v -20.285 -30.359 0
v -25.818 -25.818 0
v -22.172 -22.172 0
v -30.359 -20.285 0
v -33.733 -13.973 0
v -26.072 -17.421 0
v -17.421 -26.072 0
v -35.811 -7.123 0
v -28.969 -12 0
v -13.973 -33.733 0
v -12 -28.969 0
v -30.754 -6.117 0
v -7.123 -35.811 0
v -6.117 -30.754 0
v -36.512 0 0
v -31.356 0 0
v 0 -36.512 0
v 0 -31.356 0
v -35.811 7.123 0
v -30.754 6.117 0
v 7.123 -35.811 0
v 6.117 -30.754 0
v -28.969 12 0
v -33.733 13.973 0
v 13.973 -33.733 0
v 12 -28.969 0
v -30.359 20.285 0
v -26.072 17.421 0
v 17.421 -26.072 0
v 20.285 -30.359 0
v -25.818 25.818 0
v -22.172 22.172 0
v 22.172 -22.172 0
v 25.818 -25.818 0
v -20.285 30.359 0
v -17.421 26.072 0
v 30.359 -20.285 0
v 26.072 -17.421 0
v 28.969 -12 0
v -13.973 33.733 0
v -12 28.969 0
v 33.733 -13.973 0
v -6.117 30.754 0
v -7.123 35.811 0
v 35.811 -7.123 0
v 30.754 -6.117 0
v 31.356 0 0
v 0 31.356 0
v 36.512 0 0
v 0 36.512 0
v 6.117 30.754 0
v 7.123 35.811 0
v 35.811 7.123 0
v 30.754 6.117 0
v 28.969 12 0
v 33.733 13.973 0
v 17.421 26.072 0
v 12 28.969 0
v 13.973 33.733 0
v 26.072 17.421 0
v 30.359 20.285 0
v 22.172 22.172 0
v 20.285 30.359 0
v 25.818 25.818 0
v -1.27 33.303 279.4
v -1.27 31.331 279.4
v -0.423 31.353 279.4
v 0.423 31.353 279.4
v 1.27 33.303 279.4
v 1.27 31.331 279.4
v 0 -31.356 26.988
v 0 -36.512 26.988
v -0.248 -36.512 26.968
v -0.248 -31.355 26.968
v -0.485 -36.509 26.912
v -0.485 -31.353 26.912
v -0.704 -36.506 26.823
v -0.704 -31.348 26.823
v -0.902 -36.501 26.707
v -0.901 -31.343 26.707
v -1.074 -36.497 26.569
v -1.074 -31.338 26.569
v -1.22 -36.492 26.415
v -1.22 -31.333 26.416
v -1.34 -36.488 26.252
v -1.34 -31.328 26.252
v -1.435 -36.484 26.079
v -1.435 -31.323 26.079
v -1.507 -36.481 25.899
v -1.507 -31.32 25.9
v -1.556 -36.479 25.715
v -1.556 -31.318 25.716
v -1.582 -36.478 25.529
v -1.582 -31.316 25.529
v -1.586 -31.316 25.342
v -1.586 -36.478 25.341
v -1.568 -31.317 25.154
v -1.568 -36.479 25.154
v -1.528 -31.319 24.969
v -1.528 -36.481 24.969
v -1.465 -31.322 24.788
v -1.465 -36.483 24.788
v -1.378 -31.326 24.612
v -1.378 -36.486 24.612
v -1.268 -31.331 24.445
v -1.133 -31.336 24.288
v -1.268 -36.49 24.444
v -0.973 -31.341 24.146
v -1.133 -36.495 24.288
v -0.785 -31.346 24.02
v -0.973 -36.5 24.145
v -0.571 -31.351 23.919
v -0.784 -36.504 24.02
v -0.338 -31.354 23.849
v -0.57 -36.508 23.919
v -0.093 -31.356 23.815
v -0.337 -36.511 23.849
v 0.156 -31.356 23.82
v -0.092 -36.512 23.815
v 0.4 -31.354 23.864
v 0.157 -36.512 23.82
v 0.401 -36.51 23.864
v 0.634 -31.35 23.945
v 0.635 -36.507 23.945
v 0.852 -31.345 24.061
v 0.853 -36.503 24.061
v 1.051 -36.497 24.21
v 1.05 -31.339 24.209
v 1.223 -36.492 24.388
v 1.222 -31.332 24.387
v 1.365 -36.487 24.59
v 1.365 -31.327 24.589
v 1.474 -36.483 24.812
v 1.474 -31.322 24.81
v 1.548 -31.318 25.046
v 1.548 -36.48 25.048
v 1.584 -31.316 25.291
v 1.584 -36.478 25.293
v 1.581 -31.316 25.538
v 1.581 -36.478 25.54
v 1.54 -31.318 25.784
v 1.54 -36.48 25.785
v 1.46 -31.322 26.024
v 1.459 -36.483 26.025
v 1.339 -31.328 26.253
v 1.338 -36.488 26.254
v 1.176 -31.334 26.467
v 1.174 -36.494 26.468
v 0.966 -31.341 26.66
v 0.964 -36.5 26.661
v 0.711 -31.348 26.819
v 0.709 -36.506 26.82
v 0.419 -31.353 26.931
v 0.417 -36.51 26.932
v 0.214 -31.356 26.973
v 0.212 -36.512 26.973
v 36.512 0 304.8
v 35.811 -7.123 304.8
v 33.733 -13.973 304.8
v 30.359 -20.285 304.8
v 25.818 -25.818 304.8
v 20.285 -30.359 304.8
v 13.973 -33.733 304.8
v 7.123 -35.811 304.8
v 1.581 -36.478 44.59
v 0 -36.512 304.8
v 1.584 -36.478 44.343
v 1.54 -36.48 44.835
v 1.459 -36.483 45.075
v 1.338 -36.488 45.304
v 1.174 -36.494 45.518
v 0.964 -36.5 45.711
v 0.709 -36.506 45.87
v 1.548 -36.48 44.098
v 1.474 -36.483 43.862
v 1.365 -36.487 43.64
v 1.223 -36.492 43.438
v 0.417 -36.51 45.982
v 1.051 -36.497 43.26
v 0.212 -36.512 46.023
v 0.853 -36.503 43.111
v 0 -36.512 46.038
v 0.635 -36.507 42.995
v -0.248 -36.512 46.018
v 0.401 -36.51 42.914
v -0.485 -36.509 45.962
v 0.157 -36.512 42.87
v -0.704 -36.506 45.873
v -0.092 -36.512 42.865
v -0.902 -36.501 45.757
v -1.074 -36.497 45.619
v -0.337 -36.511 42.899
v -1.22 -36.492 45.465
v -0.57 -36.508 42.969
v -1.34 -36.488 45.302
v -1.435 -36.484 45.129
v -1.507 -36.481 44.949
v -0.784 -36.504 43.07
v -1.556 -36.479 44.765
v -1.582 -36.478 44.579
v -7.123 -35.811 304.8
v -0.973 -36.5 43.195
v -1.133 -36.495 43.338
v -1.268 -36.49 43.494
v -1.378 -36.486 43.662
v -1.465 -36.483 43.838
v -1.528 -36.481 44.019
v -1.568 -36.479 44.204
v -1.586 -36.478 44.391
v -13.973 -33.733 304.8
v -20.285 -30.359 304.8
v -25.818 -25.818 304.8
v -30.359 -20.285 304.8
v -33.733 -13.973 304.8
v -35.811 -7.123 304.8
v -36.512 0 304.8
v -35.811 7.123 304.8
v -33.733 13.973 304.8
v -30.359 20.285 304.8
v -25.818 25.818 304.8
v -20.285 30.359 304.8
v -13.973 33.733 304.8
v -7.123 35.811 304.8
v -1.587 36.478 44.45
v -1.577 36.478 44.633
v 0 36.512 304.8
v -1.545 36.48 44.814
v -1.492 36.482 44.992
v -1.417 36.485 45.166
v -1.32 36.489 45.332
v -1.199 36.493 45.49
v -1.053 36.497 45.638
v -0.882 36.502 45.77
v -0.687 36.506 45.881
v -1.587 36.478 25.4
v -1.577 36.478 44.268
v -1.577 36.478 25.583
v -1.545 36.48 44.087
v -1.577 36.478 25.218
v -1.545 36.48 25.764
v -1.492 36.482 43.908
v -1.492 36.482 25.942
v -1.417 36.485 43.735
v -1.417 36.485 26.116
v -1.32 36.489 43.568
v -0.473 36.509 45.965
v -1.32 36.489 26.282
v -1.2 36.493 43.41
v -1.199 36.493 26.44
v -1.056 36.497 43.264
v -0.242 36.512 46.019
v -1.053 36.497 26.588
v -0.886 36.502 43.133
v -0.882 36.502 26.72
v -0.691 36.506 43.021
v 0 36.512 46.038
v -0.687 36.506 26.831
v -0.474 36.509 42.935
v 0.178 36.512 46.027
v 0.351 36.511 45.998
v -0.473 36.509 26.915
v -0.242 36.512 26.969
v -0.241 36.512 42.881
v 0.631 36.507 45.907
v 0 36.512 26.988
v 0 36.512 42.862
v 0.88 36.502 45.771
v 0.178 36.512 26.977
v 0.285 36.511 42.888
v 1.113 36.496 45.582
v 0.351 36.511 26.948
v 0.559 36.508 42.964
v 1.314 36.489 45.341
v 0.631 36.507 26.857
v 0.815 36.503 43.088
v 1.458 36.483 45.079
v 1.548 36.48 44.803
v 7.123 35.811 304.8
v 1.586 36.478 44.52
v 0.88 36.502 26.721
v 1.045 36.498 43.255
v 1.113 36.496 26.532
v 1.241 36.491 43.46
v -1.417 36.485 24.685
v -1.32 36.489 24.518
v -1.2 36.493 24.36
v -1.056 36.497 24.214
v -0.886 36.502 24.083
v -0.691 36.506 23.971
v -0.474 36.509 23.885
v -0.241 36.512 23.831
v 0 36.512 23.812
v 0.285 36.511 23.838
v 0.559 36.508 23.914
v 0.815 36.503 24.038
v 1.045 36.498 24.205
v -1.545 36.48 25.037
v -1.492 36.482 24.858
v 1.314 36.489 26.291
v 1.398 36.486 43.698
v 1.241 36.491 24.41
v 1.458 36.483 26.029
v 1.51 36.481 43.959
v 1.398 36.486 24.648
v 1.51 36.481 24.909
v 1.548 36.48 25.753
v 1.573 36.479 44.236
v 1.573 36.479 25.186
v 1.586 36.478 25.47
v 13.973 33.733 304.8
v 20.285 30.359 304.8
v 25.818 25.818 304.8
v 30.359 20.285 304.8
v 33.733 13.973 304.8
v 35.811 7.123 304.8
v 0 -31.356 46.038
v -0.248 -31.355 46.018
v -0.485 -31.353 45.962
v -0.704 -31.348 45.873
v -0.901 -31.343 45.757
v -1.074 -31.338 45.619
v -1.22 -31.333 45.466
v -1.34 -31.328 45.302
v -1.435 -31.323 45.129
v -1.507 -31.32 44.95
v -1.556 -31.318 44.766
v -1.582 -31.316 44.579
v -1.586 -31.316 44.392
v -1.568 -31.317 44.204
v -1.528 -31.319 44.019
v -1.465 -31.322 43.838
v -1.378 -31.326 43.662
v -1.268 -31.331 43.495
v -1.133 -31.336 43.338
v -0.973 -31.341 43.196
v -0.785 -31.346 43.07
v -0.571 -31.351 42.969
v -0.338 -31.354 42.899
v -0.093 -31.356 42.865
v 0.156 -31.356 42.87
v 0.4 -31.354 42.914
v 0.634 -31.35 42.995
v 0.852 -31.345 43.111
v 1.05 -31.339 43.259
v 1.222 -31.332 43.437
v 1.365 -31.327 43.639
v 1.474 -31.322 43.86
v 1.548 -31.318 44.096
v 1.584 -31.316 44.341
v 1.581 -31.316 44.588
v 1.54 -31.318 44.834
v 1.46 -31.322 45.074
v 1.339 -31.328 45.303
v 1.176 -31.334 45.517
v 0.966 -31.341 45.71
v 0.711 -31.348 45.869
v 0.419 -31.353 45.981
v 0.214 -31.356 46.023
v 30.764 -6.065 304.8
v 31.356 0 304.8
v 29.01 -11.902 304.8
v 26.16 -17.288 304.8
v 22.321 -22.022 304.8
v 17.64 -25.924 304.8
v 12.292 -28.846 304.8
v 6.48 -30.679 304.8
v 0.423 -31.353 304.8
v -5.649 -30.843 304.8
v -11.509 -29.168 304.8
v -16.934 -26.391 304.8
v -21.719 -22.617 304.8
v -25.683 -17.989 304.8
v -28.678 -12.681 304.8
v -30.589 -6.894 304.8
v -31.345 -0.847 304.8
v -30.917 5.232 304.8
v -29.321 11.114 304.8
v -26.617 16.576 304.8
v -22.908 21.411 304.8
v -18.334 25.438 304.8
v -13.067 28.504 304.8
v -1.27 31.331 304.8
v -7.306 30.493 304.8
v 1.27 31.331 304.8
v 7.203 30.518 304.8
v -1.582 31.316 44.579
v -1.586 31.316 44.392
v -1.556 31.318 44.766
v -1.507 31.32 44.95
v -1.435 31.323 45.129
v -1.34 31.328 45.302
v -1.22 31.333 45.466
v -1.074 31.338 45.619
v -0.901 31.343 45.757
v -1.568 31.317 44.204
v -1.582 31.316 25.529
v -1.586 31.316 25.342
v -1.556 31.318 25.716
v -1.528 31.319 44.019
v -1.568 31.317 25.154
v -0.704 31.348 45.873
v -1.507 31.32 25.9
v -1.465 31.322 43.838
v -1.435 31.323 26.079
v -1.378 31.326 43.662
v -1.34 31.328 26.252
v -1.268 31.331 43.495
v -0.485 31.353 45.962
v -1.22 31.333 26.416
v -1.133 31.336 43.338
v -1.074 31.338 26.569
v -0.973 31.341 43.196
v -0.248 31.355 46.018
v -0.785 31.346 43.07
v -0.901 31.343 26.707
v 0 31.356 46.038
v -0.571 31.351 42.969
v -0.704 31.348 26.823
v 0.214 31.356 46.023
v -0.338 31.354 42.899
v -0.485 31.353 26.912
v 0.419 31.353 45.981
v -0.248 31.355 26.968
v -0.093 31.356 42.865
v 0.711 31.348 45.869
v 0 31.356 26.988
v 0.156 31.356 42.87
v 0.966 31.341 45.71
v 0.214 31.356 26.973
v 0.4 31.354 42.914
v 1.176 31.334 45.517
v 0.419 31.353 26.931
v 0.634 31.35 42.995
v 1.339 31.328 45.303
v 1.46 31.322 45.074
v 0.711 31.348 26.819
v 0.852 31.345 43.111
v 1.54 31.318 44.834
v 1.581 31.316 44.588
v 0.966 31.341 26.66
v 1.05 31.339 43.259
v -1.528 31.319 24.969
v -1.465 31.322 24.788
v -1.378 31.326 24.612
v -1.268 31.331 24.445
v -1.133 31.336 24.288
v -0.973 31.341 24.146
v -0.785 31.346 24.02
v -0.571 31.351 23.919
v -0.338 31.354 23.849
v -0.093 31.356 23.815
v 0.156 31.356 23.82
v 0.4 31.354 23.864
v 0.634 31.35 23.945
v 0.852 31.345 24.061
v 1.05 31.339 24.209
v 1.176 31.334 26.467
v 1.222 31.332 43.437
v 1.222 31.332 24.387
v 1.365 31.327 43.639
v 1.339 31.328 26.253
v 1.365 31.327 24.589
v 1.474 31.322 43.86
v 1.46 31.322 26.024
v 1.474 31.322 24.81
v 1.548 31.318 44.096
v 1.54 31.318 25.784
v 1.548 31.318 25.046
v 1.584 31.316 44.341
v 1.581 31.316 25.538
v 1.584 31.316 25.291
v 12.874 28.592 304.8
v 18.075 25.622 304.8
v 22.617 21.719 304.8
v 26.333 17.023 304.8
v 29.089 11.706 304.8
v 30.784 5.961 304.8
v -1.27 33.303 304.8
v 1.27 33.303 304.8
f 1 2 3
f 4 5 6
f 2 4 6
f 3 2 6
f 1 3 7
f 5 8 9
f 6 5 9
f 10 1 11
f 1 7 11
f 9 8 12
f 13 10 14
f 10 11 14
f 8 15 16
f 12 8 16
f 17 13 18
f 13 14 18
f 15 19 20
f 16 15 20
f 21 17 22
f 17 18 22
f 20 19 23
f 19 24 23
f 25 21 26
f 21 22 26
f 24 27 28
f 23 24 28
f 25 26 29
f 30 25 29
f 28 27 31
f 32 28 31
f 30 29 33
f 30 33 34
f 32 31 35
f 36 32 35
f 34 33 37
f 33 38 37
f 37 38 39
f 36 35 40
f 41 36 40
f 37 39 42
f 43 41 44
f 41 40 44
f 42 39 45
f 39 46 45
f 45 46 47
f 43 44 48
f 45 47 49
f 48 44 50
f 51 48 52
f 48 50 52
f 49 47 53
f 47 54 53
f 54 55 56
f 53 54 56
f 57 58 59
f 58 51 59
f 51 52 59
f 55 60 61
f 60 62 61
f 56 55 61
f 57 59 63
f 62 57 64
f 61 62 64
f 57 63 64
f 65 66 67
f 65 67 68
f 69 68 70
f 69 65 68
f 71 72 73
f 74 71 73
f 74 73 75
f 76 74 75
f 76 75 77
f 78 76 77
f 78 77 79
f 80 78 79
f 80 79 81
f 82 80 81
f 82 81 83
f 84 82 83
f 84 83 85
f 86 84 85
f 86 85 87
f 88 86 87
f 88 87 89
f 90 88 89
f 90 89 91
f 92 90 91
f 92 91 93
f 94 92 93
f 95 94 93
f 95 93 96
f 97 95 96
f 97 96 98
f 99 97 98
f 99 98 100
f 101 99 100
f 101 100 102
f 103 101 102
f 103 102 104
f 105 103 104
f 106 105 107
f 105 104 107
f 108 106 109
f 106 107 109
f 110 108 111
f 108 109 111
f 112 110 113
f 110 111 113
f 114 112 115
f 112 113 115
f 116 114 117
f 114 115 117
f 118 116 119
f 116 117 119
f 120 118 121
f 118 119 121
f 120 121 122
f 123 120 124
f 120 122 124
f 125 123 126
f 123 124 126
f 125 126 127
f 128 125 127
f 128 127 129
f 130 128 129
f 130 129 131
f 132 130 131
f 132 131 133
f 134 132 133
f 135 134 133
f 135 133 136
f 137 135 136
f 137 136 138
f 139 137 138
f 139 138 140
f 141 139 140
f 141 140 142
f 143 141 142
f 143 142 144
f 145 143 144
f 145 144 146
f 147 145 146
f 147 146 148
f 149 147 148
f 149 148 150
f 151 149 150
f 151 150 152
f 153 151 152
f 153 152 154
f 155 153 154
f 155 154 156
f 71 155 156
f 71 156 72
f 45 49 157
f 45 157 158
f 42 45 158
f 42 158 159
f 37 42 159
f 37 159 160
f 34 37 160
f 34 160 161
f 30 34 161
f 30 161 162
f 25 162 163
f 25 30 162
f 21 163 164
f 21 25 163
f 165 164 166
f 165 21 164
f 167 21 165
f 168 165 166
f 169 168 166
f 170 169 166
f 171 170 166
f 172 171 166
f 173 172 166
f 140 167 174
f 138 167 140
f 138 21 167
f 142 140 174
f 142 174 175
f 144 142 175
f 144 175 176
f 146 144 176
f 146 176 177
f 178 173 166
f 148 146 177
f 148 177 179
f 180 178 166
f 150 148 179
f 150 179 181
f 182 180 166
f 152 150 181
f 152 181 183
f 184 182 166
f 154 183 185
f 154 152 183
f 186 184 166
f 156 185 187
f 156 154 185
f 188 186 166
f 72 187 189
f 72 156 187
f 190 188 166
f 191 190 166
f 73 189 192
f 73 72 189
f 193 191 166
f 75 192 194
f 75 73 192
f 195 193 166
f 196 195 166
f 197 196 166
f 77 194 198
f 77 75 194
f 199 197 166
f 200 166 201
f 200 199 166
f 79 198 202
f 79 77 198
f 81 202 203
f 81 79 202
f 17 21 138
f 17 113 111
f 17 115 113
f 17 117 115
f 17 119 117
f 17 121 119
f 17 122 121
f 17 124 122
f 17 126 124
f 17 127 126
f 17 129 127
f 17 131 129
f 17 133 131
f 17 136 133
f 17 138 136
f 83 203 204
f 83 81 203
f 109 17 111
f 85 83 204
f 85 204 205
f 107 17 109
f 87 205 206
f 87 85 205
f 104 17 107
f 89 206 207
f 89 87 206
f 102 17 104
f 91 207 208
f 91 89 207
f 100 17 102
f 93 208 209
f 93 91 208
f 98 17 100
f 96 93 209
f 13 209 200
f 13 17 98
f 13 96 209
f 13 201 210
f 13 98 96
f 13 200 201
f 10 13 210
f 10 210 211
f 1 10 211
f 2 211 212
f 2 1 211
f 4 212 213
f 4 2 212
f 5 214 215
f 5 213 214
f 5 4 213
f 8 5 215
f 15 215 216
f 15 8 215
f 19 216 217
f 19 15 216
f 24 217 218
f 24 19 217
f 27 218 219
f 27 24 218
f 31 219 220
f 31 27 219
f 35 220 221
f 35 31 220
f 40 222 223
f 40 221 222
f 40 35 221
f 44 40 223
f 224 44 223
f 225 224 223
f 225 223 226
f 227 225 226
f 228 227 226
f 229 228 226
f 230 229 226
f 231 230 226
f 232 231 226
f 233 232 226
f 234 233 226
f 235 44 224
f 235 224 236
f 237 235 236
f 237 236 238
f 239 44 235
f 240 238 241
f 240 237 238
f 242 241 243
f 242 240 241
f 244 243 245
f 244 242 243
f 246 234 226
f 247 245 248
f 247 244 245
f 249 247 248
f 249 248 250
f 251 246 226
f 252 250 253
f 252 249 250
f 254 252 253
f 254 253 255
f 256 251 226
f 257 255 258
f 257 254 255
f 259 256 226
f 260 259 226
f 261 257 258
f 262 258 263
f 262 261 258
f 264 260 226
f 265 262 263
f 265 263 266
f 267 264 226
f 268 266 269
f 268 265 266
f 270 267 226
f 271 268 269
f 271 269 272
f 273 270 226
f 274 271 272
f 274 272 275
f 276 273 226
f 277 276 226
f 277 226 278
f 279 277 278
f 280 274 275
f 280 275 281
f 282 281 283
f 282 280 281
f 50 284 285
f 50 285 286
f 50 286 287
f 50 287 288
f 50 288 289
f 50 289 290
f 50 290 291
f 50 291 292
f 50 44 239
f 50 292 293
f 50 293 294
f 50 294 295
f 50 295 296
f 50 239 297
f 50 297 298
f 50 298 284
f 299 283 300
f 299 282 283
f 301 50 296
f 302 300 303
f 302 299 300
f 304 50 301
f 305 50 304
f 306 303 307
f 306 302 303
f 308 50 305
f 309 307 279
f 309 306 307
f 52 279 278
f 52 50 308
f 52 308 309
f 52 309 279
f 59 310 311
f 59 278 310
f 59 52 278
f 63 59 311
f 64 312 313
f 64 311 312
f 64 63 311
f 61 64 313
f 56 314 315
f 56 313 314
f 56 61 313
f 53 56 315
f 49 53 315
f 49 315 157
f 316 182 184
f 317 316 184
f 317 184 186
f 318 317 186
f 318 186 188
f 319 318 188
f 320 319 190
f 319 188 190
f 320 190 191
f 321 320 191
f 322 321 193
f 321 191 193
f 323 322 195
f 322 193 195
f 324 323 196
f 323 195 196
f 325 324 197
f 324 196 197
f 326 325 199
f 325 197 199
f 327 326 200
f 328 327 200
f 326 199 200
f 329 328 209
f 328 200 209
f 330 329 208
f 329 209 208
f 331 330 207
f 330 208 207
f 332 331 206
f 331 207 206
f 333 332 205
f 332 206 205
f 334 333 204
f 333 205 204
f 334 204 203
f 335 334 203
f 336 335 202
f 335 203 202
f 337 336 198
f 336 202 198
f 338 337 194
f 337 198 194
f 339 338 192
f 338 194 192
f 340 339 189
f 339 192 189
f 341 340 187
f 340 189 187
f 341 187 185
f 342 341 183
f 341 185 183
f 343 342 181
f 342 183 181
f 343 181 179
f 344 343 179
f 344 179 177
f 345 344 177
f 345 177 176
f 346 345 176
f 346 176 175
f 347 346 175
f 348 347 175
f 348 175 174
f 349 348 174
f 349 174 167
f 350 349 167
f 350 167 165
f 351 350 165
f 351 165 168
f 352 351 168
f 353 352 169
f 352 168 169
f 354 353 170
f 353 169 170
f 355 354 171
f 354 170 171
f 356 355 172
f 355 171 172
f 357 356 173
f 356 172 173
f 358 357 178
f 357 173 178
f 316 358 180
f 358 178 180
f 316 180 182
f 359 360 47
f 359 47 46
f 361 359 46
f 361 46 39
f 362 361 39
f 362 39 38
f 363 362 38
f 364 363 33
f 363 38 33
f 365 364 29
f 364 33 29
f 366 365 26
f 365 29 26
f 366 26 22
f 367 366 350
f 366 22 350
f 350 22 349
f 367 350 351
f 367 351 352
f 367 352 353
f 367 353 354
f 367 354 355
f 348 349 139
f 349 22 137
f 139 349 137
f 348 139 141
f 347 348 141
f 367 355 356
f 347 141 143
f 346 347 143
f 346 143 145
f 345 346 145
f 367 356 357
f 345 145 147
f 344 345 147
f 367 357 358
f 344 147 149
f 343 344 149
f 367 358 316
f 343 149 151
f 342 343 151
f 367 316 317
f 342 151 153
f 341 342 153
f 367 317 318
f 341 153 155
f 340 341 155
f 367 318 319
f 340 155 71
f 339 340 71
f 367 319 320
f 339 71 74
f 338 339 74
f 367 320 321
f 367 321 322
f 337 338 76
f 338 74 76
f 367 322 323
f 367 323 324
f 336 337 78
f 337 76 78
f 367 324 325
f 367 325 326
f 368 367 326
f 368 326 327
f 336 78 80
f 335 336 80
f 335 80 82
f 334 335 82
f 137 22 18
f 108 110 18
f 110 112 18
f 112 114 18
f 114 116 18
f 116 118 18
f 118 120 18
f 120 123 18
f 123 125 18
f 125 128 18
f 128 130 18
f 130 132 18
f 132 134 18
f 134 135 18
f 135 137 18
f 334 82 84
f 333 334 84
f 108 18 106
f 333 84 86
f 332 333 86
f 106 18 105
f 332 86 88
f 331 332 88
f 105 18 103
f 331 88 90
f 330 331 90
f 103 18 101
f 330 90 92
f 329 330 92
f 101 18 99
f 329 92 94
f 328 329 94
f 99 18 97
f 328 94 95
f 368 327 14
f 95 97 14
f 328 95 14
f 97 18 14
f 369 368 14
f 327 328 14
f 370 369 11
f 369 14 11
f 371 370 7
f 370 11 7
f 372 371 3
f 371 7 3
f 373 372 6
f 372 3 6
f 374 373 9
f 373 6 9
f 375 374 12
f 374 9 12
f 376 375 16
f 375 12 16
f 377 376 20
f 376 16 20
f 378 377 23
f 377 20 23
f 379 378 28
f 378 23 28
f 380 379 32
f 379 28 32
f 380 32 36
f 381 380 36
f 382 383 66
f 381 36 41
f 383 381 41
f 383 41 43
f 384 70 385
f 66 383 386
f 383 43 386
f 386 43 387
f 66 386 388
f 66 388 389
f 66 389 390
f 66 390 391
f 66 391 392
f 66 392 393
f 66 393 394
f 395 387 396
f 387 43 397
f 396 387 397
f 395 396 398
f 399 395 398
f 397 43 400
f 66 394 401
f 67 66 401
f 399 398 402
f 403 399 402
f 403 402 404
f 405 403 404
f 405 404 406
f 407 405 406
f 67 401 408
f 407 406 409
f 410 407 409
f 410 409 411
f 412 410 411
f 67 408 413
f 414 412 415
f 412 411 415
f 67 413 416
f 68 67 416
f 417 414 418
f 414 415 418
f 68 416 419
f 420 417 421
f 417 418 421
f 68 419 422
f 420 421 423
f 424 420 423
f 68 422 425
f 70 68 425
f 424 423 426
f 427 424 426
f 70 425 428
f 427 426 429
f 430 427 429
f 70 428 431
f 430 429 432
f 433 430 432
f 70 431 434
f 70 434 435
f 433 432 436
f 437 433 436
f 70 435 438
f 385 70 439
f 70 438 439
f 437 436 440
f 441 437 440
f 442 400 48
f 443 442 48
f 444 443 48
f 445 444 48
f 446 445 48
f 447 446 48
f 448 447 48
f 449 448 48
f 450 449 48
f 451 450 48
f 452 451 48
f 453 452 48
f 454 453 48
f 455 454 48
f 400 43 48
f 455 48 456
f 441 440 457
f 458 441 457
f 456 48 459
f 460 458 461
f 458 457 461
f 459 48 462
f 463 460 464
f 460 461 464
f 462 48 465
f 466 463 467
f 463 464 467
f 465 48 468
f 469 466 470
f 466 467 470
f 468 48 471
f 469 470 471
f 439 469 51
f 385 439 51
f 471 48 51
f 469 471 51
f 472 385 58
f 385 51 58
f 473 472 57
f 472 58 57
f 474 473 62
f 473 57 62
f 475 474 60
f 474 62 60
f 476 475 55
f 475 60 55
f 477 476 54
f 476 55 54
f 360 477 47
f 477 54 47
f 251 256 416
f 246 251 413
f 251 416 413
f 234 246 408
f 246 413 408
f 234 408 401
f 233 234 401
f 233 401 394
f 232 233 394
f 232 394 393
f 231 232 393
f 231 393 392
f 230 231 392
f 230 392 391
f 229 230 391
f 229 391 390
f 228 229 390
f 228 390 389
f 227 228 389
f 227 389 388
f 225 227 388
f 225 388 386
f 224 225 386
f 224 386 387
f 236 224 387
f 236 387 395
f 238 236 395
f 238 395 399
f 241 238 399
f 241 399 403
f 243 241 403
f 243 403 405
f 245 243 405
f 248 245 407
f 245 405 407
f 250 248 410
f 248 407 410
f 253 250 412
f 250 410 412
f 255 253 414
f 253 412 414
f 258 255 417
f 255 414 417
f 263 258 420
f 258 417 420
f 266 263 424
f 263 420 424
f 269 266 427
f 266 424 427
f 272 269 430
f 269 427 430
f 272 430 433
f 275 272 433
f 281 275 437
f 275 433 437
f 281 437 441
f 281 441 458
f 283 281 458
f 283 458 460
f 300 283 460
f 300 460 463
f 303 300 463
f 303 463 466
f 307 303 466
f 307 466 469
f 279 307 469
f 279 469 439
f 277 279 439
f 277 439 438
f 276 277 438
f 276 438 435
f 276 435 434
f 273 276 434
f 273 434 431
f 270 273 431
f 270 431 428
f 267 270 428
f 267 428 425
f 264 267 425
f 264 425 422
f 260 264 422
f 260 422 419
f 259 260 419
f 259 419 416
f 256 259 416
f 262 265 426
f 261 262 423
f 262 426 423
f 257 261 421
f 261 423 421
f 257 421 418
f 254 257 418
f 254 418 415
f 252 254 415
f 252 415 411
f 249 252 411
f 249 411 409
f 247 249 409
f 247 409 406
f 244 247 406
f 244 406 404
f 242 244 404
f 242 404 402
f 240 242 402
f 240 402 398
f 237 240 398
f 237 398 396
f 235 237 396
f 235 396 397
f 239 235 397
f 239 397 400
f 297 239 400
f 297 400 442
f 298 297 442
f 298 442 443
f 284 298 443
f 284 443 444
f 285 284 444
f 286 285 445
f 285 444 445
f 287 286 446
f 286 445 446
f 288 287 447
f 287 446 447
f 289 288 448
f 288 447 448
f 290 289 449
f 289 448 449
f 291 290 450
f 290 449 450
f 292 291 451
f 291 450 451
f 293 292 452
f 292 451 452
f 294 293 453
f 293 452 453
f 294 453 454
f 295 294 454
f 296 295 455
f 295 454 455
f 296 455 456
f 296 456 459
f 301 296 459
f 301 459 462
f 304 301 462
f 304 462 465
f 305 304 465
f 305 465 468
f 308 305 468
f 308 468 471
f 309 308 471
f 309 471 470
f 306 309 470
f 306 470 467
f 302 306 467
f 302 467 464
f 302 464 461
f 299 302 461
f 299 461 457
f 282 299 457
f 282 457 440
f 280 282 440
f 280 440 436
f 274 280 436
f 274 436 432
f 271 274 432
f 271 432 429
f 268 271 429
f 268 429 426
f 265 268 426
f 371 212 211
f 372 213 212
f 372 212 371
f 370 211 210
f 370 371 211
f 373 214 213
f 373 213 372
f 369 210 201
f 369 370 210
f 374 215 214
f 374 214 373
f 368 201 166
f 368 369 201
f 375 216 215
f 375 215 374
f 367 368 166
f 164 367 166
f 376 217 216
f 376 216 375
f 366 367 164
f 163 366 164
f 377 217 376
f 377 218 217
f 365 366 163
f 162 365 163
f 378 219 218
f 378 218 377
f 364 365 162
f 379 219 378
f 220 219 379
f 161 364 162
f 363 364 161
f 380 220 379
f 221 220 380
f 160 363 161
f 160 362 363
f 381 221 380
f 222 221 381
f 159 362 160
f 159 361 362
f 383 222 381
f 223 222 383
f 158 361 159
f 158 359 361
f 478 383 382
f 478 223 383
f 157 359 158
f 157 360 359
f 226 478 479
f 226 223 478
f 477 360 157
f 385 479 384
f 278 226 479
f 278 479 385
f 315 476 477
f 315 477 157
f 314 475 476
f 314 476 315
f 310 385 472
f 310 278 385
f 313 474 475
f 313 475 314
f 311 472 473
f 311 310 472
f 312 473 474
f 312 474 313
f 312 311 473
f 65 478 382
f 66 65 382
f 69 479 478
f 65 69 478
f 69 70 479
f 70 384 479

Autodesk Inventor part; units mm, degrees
ref_plane "YZ Plane" through (0, 0, 0) normal (1, 0, 0) x (0, 1, 0)
sketch "Sketch1" plane through (0, 0, 0) normal (0, 0, 1) x (1, 0, 0)
  circle A0 centre (0, 0) radius 36.5125
  circle A1 centre (0, 0) radius 31.3563
  dimension "d0" = 73.025
  dimension "d2" = 5.1562
extrude "Extrusion1" add sketch "Sketch1" along normal blind 304.8
sketch "Sketch2" plane through (0, 0, 304.8) normal (0, 0, 1) x (1, 0, 0)
  circle A0 centre (0, 0) radius 31.3563 projected
  circle A1 centre (0, 0) radius 36.5125 projected
  point P0 (0, 36.5125)
ref_plane "Work Plane1" through (0, 36.5125, 304.8) normal (0, 1, 0) x (-1, 0, 0)
sketch "Sketch5" plane through (0, 36.5125, 304.8) normal (0, 1, 0) x (-1, 0, 0)
  circle A0 centre (0, -279.4) radius 4.4901
  circle A1 centre (0, -260.35) radius 4.4901
  point P0 (0, -304.8)
  dimension "d25" = 25.4
  dimension "d26" = 19.05
hole "Hole3" at (0, 36.5125, 44.45) at (0, 36.5125, 25.4) direction (0, -1, 0) diameter 3.175 end through all
sketch "Sketch6" plane through (0, 0, 304.8) normal (0, 0, 1) x (1, 0, 0)
  circle A0 centre (0, 0) radius 31.3563 projected
  circle A1 centre (0, 0) radius 36.5125 projected
  point P0 (0, 36.5125)
ref_plane "Work Plane2" through (0, 36.5125, 304.8) normal (0, 1, 0) x (-1, 0, 0)
sketch "Sketch9" plane through (0, 0, 304.8) normal (0, 0, 1) x (1, 0, 0)
  circle A0 centre (0, 0) radius 31.3563 projected
  circle A1 centre (0, 0) radius 36.5125 projected
  line L0 (-1.27, 30.7627) -> (1.27, 30.7627)
  line L1 (1.27, 30.7627) -> (1.27, 33.3027)
  line L2 (1.27, 33.3027) -> (-1.27, 33.3027)
  line L3 (-1.27, 33.3027) -> (-1.27, 30.7627)
  line L4 (0, 33.3027) -> (0, 30.7627) construction
  line L5 (0, 31.3563) -> (0, 36.5125) construction
  dimension "d38" = 2.54
  dimension "d39" = 2.54
extrude "Extrusion3" cut sketch "Sketch9" against normal blind 25.4 contours L1 L0 L3 A0 | A0 L3 L2 L1 picked at (0.1411, 30.9596)
properties part number "2h2slv" material "PVC-Piping"
